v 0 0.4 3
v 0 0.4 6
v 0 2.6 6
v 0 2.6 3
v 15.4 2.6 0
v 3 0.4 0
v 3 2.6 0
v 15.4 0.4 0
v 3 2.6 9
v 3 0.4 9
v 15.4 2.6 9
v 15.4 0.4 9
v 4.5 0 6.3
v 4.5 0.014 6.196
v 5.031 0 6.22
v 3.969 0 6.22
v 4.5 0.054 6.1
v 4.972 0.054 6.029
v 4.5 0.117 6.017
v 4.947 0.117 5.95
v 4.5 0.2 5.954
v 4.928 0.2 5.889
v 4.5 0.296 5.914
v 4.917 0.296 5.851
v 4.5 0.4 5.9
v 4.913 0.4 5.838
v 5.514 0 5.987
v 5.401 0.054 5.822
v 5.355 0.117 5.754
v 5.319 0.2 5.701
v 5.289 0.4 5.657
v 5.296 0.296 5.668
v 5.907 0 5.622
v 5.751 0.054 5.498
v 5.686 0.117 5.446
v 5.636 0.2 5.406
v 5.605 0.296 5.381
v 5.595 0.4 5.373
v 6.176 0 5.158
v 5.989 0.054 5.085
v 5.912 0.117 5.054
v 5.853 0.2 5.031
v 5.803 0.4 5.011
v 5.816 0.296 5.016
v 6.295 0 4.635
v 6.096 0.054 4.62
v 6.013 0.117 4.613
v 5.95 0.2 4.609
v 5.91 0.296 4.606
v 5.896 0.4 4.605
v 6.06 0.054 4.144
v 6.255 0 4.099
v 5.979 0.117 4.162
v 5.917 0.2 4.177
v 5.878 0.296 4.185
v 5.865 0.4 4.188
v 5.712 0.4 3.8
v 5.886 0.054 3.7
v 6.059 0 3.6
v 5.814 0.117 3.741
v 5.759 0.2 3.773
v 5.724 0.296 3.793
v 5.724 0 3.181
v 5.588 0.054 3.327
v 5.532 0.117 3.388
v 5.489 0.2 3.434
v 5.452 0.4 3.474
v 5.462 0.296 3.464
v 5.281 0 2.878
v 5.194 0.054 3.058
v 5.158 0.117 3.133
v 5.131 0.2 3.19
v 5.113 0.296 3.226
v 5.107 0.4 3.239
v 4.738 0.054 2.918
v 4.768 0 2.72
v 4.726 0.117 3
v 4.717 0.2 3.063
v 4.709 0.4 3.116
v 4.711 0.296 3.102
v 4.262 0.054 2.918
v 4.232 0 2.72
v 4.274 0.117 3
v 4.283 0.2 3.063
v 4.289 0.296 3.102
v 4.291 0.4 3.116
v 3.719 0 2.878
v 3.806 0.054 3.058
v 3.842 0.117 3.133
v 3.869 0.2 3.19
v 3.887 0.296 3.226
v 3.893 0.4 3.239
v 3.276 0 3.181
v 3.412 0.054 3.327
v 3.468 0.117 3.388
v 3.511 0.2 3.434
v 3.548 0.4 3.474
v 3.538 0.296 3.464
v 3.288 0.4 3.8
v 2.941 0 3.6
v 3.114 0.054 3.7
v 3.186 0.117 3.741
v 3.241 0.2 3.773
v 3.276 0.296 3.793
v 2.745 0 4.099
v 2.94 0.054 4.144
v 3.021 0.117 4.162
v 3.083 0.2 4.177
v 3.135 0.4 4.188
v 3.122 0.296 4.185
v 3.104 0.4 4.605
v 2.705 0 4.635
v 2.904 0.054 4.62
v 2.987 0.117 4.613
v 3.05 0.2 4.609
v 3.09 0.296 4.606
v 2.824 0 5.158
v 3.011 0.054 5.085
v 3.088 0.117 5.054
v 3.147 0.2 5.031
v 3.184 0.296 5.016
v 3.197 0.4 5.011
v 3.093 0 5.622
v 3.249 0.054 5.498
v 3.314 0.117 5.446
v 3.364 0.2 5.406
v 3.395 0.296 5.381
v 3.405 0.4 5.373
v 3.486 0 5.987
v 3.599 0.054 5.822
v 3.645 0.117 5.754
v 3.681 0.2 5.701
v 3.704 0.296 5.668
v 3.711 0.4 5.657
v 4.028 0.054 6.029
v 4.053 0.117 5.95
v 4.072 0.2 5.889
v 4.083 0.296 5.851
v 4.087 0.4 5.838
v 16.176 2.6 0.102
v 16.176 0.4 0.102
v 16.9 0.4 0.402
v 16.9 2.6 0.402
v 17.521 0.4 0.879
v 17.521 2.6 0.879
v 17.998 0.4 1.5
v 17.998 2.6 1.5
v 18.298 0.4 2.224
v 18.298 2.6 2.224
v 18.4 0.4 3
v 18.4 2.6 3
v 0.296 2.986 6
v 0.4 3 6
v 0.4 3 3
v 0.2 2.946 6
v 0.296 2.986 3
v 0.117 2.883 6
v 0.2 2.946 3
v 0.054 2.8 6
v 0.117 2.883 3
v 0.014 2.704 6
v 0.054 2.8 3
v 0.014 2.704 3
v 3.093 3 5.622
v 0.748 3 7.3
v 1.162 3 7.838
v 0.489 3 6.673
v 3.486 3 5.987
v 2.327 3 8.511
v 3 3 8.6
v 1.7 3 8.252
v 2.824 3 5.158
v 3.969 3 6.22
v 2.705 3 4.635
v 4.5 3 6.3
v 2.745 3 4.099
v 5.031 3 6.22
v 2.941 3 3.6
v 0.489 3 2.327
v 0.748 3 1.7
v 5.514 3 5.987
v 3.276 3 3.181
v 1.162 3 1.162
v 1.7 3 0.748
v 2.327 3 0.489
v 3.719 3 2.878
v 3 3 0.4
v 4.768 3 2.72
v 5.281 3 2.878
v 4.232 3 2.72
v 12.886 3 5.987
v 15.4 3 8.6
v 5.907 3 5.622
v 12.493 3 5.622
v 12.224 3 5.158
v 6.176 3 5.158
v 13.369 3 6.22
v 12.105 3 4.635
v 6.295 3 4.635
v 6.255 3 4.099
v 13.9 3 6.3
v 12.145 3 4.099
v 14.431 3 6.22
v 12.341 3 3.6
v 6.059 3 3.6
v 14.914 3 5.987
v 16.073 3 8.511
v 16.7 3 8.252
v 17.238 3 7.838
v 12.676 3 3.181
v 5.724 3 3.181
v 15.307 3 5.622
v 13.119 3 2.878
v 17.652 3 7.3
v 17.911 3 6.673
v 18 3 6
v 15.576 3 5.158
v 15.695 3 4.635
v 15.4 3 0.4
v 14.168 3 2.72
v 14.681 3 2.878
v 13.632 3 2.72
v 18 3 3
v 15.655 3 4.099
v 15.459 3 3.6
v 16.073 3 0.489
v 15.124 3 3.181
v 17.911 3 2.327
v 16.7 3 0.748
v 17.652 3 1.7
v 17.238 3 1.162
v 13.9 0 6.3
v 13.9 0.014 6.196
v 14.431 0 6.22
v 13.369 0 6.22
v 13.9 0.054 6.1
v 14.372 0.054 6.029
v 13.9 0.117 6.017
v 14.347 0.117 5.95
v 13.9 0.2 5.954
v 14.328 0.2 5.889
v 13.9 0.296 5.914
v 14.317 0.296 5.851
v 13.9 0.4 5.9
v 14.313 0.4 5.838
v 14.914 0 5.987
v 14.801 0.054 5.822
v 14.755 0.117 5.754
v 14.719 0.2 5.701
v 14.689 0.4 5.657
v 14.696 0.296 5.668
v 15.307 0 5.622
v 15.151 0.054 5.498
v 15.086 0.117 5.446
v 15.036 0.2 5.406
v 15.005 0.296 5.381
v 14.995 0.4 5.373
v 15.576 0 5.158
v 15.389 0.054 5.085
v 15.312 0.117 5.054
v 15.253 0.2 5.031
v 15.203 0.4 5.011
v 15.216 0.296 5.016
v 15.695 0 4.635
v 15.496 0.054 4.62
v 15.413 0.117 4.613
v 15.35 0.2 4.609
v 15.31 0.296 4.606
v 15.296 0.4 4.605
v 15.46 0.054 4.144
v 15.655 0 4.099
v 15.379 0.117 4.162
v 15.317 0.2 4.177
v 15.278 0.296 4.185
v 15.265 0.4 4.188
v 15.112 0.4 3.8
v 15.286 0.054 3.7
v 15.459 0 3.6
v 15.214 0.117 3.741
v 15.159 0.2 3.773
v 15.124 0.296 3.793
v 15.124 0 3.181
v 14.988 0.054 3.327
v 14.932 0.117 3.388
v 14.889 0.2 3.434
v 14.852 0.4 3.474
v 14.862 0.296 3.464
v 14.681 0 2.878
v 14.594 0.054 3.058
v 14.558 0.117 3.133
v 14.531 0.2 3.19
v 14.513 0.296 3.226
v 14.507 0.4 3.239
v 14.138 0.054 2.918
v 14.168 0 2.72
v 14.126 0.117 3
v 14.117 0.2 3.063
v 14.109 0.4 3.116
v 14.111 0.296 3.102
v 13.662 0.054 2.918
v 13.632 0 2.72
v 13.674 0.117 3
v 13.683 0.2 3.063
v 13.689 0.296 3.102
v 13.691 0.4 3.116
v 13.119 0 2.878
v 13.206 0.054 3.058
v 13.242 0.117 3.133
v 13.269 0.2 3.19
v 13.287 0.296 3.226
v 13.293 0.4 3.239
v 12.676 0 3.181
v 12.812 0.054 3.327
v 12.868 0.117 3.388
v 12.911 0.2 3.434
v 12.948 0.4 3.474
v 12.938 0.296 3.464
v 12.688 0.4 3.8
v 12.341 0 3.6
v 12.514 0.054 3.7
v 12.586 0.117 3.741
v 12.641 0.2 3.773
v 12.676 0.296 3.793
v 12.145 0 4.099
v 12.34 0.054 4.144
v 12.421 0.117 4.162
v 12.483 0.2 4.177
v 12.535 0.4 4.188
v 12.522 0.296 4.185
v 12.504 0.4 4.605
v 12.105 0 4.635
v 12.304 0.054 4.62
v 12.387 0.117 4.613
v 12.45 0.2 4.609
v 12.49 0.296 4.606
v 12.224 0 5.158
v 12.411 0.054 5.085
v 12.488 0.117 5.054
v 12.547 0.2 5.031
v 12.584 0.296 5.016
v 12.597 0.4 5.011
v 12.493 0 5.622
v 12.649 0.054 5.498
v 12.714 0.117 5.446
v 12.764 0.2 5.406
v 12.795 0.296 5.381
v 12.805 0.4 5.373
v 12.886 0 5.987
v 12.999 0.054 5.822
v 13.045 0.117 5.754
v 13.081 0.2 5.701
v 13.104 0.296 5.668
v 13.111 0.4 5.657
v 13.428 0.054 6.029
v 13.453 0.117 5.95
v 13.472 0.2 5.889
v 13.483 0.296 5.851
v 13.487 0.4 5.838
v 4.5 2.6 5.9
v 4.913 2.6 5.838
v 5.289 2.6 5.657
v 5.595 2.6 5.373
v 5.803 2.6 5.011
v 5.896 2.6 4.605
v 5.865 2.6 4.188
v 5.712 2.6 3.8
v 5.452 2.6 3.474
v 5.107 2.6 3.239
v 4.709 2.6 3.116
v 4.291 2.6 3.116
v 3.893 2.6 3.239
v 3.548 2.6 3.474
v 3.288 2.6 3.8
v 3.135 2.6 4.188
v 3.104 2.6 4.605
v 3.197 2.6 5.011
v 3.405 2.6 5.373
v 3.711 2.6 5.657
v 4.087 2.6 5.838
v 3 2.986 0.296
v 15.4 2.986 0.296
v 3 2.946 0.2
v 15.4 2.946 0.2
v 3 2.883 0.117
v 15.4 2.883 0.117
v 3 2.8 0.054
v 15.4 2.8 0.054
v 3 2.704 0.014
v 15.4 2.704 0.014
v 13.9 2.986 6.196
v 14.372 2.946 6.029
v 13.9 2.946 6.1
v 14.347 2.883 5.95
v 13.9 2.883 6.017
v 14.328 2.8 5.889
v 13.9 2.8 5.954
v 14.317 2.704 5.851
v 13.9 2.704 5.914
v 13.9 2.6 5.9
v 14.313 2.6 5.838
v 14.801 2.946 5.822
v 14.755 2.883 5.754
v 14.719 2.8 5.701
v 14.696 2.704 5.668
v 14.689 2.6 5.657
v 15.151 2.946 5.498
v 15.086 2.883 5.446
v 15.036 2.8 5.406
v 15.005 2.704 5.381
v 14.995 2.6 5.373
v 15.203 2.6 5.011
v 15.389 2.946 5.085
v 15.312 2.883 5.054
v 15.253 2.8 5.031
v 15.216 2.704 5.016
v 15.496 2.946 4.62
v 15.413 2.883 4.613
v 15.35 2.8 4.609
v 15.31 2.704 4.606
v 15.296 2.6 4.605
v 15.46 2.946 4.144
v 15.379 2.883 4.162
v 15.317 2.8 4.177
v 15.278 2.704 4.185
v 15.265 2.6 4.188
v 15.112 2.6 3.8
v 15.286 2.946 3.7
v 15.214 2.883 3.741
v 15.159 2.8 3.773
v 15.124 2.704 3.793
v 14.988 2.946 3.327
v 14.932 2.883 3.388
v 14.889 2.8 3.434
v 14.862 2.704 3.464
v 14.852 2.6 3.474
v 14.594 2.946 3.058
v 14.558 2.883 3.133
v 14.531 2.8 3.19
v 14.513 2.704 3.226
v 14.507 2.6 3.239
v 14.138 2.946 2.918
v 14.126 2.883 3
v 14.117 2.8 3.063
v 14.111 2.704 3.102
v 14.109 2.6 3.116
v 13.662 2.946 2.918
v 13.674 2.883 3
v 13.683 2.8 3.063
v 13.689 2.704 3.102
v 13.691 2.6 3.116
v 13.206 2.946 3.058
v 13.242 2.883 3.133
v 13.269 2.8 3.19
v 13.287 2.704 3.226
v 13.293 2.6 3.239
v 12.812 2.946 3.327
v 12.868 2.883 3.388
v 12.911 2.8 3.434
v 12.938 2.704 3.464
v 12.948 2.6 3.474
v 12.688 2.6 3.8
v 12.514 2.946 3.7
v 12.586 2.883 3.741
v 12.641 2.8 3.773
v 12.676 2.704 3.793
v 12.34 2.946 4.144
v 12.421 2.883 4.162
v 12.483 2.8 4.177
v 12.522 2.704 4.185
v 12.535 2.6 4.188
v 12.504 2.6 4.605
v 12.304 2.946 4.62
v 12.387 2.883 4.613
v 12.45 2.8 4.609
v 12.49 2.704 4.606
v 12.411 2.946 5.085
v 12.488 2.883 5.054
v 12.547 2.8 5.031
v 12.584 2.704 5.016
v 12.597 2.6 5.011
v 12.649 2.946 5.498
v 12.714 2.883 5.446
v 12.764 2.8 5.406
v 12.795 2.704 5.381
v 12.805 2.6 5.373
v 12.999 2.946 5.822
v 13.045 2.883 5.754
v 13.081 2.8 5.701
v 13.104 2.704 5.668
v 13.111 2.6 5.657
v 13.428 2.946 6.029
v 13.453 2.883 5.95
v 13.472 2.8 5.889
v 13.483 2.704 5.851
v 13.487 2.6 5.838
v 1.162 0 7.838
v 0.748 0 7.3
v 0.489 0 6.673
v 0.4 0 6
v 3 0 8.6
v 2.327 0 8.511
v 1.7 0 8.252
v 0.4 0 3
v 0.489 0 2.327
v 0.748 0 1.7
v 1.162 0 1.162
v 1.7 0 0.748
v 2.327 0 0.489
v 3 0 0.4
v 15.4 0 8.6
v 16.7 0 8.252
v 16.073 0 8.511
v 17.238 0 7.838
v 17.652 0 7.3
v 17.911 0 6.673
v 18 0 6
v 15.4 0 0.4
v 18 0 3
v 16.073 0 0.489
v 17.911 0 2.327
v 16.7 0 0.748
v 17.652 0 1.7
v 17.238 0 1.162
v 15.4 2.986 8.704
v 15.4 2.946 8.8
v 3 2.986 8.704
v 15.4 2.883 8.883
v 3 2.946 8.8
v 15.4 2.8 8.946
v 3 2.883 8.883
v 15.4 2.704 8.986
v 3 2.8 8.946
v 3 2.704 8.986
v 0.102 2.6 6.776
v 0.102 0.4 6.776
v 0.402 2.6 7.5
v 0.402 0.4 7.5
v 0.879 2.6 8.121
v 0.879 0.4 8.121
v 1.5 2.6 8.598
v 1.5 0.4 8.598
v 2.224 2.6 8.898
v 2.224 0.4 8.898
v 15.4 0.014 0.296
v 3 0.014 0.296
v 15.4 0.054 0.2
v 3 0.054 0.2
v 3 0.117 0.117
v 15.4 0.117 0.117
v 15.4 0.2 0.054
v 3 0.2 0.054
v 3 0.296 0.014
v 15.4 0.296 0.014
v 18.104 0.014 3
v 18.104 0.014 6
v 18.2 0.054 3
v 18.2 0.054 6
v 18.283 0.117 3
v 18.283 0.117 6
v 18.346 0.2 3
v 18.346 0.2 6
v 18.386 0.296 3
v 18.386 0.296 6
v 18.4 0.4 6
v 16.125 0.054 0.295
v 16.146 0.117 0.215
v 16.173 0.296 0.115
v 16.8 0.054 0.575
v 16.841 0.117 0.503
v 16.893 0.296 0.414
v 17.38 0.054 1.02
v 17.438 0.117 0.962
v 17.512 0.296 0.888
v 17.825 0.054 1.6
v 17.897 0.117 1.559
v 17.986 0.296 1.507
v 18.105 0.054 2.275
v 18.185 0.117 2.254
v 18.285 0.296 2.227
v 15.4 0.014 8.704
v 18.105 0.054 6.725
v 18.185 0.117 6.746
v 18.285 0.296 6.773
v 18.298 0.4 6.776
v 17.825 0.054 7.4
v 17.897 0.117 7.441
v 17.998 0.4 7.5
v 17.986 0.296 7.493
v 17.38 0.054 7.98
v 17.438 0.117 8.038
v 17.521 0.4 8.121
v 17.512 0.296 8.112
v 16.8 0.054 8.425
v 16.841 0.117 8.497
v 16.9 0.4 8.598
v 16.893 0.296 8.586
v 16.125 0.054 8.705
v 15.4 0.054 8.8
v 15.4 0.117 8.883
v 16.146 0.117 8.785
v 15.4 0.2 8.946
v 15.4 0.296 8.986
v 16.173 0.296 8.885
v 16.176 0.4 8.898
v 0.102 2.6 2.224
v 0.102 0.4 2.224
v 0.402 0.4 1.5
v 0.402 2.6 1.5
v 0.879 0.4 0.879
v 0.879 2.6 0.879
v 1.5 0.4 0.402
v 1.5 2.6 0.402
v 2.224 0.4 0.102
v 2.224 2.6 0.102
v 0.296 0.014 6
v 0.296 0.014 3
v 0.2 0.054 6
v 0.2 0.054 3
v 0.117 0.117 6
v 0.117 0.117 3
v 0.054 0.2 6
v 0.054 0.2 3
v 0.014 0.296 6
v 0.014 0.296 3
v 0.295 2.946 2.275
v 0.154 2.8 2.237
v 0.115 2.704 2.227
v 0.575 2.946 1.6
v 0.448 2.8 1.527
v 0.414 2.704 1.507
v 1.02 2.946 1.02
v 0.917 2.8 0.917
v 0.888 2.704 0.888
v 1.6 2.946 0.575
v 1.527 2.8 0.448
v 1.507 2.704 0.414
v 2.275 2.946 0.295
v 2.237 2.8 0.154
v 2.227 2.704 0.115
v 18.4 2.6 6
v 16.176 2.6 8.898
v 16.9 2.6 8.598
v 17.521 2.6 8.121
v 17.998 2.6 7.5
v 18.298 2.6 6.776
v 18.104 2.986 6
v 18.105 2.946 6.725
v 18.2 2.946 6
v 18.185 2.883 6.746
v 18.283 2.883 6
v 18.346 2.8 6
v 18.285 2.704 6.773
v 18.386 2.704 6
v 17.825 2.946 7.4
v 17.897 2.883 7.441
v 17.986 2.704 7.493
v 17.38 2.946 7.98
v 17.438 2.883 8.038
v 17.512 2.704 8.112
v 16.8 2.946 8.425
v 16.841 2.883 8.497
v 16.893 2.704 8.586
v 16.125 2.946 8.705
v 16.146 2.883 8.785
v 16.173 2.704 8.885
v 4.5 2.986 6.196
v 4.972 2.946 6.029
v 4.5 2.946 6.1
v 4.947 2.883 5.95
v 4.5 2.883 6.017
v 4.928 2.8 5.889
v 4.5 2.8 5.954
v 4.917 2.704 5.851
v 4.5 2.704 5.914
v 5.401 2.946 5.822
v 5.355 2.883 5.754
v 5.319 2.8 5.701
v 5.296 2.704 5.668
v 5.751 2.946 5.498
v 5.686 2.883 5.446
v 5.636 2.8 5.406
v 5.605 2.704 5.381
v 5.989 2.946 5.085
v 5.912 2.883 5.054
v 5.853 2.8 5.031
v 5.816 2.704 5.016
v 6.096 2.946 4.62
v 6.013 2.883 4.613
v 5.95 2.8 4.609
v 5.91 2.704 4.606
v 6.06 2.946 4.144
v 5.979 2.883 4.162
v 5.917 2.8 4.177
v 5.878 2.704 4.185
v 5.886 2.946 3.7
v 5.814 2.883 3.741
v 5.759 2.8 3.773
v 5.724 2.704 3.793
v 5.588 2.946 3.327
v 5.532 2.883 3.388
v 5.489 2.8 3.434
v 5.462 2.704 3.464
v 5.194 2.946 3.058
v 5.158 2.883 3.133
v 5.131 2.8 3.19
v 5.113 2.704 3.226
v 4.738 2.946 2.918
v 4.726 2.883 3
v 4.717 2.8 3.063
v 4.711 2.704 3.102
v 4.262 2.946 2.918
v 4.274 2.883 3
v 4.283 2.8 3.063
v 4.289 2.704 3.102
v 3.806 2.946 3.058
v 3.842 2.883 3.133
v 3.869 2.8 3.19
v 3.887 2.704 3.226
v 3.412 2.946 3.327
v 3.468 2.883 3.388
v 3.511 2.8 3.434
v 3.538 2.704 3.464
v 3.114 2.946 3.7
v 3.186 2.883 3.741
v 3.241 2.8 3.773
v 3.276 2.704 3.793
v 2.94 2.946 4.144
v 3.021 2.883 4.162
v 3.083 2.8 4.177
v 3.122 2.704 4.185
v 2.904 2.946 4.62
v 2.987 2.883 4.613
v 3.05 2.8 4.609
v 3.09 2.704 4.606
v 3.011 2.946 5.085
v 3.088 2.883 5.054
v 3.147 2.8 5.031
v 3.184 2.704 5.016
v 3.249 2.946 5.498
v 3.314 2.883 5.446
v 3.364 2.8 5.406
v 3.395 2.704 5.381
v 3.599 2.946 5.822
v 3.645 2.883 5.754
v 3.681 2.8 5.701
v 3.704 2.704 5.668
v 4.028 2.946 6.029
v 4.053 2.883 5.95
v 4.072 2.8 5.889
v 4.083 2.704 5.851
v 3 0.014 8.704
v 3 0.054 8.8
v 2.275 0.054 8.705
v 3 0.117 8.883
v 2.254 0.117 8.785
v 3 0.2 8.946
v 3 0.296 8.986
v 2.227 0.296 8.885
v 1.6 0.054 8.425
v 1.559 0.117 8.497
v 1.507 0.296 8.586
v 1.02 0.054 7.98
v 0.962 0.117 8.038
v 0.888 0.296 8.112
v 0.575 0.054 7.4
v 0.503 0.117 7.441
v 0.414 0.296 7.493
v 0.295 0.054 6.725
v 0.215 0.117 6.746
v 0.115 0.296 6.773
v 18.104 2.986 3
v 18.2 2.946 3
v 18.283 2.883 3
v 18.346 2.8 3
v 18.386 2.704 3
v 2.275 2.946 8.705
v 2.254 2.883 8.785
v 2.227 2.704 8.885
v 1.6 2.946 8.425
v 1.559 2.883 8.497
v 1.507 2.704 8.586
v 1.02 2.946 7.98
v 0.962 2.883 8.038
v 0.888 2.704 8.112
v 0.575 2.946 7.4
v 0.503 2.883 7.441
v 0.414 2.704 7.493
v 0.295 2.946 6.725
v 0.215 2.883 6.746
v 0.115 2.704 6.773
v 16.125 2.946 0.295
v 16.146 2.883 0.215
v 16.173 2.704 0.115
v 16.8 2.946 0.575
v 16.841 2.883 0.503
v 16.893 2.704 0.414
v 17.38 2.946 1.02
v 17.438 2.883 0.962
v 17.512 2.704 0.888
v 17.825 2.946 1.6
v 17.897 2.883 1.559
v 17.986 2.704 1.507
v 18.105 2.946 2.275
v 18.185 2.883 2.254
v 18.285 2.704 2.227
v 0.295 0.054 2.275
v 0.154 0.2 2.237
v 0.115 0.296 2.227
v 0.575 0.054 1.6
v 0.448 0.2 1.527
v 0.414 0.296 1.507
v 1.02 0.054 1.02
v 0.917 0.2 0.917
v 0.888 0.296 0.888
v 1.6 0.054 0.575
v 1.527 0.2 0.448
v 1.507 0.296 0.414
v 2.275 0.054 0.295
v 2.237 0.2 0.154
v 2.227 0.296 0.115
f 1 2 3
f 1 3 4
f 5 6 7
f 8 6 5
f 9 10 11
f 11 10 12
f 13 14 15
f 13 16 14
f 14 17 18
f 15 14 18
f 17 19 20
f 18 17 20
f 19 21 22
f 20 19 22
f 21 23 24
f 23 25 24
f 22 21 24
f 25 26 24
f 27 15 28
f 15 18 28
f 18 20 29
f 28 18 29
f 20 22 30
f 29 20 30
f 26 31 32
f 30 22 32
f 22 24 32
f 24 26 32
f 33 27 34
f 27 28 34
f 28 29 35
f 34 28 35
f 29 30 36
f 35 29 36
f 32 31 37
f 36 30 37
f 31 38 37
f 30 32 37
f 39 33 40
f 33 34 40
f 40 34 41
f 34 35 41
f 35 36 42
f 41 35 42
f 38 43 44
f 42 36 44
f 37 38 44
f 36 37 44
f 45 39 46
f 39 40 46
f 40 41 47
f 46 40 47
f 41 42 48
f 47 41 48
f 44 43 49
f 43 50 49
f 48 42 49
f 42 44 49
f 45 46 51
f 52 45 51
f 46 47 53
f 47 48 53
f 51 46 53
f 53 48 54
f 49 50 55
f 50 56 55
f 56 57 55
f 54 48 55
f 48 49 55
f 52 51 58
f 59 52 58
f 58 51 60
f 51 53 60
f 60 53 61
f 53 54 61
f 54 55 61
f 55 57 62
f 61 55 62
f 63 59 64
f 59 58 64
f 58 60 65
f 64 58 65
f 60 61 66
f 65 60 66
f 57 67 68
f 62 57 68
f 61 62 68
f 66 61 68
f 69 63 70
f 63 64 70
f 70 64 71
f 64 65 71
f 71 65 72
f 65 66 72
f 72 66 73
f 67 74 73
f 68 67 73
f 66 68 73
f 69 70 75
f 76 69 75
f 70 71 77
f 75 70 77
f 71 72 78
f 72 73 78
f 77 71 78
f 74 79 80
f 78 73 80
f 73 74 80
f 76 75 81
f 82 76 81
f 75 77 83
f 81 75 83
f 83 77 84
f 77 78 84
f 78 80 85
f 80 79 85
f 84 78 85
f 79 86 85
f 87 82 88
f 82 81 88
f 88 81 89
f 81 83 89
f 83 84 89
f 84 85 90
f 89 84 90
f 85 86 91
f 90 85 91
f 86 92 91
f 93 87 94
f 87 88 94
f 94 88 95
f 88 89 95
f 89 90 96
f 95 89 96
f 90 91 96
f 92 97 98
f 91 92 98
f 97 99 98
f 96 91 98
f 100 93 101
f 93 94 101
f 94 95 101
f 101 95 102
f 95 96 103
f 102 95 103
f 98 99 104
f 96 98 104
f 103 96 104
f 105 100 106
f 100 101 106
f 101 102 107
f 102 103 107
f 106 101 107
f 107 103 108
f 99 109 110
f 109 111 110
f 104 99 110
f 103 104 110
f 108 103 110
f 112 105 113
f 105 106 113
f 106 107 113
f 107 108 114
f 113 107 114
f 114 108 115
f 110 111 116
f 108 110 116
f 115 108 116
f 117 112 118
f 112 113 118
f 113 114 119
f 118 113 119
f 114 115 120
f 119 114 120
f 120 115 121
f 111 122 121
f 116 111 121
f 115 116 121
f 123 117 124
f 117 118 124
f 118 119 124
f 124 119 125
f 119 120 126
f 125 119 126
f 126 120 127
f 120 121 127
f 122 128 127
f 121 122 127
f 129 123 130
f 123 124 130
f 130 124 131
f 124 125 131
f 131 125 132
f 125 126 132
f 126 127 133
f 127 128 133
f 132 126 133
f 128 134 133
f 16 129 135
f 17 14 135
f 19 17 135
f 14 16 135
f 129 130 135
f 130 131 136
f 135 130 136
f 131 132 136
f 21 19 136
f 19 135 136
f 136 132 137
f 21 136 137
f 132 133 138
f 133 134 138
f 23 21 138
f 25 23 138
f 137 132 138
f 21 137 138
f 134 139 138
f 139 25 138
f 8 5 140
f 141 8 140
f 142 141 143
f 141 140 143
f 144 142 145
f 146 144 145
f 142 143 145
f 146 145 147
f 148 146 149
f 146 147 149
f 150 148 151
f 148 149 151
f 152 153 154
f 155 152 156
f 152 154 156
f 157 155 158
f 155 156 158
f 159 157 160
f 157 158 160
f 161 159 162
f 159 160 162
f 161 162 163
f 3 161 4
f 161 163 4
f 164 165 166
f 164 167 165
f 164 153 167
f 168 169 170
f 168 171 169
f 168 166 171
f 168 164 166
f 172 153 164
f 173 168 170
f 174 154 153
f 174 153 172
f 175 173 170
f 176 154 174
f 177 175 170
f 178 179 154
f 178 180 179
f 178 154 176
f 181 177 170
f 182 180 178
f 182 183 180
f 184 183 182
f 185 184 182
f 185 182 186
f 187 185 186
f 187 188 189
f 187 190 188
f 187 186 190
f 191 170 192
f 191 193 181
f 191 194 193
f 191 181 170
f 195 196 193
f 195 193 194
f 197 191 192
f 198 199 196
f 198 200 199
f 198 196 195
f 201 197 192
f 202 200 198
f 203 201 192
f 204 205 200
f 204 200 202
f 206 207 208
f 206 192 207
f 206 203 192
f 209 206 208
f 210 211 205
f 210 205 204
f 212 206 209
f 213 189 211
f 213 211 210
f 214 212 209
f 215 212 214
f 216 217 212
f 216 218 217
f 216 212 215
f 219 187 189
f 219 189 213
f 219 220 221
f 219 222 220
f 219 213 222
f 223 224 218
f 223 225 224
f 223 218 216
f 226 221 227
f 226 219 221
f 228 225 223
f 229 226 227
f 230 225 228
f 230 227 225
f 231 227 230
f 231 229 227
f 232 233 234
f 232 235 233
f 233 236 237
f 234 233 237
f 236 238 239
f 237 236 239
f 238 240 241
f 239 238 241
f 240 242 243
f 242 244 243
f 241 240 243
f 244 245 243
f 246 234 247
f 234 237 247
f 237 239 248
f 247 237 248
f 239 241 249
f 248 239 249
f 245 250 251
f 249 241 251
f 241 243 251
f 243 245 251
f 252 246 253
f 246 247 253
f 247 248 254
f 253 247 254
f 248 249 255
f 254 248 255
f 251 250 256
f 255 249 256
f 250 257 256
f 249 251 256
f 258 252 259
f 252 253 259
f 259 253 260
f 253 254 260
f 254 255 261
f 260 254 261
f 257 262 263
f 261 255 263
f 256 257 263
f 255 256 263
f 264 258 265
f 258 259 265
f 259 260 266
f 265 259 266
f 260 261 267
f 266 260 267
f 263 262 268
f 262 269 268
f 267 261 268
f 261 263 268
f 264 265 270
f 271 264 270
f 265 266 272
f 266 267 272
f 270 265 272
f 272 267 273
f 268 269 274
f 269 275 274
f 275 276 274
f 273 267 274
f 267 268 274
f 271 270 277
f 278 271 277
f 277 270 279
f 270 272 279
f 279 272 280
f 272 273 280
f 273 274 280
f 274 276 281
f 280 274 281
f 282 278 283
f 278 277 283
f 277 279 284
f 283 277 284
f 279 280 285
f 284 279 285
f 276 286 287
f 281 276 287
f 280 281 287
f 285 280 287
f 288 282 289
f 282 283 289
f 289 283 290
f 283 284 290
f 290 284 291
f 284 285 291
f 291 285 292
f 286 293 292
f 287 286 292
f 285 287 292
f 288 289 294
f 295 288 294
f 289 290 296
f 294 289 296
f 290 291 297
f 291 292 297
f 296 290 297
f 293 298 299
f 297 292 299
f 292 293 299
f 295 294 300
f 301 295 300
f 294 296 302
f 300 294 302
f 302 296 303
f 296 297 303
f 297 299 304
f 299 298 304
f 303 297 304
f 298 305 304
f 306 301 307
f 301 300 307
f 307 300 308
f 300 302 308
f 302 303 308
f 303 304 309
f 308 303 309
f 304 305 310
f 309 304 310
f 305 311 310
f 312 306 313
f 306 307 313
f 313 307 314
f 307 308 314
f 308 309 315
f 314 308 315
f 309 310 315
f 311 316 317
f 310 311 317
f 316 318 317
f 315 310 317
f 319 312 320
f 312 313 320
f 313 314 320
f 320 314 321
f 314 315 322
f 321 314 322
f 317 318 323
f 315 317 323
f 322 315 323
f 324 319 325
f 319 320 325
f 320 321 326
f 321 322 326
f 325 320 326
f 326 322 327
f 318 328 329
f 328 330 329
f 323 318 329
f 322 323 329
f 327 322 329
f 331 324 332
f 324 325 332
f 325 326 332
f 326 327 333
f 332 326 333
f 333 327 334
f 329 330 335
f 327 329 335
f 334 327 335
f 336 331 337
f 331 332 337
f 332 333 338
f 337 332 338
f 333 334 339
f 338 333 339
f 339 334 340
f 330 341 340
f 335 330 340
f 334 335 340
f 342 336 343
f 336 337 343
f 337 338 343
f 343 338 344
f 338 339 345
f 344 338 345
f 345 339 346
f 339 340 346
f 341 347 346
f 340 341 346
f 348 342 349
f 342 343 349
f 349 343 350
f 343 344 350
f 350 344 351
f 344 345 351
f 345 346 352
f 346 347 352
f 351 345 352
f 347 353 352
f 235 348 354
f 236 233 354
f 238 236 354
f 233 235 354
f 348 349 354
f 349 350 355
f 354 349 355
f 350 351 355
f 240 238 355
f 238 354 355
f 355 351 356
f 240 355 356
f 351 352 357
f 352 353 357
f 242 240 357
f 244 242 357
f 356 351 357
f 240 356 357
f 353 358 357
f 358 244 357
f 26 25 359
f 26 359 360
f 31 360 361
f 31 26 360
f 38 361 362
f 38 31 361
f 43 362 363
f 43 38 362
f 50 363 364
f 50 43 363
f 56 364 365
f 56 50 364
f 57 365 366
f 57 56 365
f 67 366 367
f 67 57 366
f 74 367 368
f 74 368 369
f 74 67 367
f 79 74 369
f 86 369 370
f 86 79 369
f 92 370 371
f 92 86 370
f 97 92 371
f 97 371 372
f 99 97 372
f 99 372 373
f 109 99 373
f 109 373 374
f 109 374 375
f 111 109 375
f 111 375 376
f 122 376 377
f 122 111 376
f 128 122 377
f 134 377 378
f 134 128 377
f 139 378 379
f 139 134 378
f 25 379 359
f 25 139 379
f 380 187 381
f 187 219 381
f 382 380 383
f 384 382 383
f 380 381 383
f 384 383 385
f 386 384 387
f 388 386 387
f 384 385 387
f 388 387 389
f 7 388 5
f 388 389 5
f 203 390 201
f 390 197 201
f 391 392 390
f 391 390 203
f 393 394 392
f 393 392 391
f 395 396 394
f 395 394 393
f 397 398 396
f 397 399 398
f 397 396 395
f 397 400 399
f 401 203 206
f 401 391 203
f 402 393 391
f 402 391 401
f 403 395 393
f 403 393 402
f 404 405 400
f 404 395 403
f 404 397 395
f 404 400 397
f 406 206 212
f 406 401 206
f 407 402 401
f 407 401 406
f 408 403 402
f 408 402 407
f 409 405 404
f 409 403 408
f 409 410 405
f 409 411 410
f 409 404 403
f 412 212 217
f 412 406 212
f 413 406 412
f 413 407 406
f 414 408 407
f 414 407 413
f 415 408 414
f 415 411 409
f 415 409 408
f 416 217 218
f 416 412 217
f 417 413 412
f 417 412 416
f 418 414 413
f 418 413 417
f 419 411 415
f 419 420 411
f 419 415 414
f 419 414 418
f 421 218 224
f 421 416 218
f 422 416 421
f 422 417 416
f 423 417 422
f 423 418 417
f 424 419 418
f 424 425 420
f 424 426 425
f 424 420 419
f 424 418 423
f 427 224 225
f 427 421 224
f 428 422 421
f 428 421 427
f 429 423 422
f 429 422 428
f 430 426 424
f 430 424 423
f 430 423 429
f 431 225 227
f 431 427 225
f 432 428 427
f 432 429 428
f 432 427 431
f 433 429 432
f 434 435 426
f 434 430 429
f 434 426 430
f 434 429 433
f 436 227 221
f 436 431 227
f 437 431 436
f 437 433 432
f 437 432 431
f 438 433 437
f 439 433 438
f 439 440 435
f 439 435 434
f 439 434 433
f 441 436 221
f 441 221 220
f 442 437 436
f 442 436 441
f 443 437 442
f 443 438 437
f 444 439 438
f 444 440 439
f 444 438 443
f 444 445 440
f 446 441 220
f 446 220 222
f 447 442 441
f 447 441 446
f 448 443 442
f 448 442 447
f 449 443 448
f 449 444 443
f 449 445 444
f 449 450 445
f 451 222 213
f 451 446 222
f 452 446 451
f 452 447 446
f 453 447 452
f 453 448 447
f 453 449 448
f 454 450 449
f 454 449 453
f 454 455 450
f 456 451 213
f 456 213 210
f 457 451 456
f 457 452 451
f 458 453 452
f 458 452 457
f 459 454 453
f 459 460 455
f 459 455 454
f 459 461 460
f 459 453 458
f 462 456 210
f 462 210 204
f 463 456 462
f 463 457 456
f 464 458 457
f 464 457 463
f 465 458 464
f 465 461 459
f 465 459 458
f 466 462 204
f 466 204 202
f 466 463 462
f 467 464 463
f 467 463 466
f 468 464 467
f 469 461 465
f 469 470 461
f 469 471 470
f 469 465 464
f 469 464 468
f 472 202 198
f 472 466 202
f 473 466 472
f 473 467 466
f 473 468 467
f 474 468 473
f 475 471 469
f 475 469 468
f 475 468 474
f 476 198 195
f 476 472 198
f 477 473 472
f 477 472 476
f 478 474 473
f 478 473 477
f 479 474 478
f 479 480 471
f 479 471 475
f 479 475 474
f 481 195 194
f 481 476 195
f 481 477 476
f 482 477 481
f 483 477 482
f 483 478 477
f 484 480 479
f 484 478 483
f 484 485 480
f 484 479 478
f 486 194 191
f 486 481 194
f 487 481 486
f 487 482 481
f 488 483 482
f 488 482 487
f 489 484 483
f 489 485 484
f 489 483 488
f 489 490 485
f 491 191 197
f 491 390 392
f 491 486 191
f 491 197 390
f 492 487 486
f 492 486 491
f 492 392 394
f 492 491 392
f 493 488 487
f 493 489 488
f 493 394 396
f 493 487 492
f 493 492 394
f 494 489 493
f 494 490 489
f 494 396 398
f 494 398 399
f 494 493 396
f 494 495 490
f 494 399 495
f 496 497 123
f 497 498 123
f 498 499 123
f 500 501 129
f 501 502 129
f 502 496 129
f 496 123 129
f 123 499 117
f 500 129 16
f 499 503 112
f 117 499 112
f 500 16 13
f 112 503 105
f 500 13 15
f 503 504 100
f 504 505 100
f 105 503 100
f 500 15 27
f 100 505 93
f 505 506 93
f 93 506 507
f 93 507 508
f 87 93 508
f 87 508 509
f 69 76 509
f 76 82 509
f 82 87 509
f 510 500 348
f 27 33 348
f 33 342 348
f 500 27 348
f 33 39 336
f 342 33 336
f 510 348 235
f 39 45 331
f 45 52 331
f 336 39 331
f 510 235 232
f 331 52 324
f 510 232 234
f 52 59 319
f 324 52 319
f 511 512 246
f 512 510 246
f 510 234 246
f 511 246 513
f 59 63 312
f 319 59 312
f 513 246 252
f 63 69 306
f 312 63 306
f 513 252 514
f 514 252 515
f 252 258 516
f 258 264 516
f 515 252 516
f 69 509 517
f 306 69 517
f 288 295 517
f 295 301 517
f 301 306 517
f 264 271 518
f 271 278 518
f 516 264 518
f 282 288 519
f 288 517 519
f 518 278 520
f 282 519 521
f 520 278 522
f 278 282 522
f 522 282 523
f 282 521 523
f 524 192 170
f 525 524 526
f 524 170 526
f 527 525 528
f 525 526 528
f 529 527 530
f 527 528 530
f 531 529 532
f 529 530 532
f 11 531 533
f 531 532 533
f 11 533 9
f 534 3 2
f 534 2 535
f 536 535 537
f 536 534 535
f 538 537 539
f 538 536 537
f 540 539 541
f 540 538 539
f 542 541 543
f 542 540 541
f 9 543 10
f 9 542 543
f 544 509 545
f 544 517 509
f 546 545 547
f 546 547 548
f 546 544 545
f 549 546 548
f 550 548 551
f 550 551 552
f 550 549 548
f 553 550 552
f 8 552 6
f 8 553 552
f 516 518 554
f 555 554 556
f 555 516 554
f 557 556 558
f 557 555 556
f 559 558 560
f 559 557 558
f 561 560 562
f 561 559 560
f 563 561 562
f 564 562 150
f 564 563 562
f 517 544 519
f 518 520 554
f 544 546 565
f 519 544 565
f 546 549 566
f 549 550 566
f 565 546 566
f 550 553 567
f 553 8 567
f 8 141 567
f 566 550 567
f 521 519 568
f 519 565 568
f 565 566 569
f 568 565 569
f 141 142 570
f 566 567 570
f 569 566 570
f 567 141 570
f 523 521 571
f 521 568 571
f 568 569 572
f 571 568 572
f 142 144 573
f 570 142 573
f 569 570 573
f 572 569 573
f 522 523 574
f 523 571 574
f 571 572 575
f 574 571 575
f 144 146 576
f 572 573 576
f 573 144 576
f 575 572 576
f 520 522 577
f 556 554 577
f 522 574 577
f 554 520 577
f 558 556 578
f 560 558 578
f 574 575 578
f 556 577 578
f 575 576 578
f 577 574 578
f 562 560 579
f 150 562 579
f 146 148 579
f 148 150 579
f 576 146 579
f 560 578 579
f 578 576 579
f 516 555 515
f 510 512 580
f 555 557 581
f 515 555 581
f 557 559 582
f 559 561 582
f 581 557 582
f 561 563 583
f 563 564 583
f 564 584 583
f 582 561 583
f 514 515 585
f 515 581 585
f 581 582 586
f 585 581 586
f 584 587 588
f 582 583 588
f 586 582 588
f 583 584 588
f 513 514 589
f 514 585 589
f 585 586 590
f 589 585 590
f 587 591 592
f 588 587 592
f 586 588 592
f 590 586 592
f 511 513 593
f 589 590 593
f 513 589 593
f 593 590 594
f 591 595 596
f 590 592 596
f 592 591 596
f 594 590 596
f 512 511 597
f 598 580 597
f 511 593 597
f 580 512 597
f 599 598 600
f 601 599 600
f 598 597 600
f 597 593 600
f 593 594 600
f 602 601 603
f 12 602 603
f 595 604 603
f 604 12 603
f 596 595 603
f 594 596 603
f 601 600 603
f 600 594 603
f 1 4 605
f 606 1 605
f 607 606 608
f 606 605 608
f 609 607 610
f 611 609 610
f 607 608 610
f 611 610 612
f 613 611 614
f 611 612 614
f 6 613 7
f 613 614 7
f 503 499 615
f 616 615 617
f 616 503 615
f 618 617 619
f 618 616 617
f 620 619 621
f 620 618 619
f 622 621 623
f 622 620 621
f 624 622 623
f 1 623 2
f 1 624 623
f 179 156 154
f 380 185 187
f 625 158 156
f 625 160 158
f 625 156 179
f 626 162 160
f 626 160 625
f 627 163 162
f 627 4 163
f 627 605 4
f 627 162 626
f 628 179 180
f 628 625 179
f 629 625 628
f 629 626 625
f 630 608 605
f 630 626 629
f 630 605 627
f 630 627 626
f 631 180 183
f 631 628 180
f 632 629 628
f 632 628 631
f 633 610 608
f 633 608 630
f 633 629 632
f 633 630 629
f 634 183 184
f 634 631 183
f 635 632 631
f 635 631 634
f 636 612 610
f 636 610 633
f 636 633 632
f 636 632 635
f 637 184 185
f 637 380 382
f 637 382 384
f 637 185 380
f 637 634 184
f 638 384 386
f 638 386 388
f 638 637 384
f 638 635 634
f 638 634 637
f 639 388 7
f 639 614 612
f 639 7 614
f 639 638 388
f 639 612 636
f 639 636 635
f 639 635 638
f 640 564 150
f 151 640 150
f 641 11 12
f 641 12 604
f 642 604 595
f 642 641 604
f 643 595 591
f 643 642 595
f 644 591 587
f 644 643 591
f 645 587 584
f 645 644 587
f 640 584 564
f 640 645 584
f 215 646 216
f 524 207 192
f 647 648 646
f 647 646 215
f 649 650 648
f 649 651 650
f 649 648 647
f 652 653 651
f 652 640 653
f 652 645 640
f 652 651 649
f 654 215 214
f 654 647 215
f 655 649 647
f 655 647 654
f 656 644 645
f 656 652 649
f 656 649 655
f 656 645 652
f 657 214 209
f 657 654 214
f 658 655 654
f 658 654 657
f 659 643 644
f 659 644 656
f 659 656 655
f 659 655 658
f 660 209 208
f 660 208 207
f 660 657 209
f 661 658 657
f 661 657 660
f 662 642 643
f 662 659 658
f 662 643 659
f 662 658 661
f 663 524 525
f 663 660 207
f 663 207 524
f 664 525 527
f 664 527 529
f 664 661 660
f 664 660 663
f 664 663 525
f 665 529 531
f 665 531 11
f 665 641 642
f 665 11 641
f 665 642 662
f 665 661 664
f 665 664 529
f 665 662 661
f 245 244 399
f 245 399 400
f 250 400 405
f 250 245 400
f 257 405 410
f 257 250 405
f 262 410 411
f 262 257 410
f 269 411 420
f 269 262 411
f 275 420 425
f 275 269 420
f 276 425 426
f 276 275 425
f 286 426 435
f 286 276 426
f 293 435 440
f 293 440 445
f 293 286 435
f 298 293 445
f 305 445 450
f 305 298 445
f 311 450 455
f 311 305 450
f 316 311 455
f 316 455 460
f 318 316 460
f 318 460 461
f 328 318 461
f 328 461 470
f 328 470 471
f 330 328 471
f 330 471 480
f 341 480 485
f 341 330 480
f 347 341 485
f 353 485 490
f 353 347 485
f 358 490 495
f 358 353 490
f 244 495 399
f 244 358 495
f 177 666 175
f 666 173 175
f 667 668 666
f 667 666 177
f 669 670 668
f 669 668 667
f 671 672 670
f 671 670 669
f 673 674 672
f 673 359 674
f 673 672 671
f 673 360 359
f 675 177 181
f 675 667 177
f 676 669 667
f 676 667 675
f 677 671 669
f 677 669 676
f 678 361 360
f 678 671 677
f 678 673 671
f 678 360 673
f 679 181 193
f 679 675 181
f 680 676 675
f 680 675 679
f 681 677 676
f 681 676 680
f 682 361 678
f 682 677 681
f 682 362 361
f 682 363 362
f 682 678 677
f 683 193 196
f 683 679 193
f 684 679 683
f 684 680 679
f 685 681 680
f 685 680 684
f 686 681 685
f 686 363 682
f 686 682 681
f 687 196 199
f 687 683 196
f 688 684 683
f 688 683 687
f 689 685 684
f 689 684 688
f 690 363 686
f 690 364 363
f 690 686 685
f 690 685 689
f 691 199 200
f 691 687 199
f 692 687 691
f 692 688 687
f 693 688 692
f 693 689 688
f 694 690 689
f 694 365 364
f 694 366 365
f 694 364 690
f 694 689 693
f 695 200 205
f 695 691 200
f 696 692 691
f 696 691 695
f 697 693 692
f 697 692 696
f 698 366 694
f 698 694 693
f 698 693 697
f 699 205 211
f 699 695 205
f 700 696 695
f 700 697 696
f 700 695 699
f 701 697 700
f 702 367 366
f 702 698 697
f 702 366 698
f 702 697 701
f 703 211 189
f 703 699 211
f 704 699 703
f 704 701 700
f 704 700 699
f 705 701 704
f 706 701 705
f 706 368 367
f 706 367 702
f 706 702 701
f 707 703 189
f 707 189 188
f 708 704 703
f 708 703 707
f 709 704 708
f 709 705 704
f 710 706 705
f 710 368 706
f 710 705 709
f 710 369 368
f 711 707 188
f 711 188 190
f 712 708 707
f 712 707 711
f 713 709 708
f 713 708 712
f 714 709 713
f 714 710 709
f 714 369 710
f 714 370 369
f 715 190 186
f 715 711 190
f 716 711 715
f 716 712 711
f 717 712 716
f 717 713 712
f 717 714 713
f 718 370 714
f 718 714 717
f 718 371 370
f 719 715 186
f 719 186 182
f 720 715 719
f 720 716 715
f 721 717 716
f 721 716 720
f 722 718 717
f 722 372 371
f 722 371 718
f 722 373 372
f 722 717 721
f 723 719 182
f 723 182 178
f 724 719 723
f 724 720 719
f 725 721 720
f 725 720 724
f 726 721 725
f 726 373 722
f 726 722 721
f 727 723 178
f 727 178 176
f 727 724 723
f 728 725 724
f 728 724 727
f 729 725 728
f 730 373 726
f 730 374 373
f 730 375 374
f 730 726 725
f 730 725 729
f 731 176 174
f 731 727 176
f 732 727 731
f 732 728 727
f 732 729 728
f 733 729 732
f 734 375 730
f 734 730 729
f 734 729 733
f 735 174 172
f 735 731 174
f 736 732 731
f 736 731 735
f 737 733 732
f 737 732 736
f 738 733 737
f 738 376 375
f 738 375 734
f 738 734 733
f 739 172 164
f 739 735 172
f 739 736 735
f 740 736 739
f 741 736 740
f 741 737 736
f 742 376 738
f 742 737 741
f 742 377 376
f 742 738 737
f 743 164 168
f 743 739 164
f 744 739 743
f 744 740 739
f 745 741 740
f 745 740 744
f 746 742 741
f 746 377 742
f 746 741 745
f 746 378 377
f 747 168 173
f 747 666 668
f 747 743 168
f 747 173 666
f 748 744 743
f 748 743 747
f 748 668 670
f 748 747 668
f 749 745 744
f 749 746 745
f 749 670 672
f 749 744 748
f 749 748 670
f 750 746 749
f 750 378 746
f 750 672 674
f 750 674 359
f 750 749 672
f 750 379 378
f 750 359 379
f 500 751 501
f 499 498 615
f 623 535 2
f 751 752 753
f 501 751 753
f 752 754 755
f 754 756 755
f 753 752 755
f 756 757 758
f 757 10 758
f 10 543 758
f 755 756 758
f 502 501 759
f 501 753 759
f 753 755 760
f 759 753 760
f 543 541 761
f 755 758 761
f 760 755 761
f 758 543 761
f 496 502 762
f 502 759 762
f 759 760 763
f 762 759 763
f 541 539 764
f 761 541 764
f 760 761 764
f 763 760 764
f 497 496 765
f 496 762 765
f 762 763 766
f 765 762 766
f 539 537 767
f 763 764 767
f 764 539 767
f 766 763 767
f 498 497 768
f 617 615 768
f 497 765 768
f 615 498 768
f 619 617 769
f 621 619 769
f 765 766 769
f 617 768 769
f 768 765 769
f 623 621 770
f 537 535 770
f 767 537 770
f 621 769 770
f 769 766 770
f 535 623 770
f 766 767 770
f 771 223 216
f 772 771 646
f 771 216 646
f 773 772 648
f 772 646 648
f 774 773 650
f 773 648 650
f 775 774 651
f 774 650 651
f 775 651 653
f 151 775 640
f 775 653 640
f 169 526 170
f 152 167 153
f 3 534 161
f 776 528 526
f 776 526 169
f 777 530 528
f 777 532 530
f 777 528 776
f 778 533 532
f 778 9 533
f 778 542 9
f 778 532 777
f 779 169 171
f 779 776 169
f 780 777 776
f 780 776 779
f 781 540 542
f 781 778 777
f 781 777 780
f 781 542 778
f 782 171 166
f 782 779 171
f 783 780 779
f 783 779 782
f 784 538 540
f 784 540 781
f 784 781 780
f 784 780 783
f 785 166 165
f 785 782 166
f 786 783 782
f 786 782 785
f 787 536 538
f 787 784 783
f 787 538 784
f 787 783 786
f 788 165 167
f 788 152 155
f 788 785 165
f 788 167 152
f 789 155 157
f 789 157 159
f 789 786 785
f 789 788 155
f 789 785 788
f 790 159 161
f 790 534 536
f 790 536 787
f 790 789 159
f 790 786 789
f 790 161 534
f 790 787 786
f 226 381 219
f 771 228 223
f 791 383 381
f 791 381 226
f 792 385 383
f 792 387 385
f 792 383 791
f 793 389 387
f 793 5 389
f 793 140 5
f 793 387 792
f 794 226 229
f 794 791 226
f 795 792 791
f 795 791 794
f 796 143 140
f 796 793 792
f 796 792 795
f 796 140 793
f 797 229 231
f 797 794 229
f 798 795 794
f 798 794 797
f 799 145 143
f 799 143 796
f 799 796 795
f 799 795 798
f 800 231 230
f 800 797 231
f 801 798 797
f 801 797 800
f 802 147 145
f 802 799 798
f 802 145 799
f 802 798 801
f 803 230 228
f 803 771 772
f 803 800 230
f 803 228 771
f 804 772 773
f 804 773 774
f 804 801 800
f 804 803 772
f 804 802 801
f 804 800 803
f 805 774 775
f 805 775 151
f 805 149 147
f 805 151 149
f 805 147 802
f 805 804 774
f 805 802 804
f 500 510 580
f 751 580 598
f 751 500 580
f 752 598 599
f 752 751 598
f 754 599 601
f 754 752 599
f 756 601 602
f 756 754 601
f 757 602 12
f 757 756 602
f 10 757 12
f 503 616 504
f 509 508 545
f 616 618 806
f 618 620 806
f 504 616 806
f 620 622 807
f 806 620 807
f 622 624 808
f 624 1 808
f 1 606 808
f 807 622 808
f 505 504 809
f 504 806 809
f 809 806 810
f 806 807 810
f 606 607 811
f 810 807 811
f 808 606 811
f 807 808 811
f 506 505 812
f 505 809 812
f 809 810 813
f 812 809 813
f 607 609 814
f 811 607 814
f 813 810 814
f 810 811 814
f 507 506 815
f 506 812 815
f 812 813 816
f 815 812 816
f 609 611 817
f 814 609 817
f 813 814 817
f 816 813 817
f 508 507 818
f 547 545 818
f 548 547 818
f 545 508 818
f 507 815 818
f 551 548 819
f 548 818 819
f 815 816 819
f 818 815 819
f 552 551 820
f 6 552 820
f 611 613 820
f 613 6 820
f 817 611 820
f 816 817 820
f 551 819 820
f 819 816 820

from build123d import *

# Parameters (mm, degrees)
SKETCH1_W           = 18.4
SKETCH1_H           = 9
SKETCH1_R           = 1.4
BOSS_EXTRUDE1_DEPTH = 3
FILLET2_R           = 3
FILLET3_R           = 0.4


with BuildPart() as part:
    # Sketch1 → Boss-Extrude1 (new body)
    with BuildSketch(Plane(origin=(0, 0, 0), x_dir=(1, 0, 0), z_dir=(0, 1, 0))):
        with Locations((9.2, -4.5)):
            Rectangle(SKETCH1_W, SKETCH1_H)
        with Locations(Location((4.5, -4.5, 0), (0, 0, 270))):
            Circle(SKETCH1_R, mode=Mode.SUBTRACT)
        with Locations(Location((13.9, -4.5, 0), (0, 0, 270))):
            Circle(SKETCH1_R, mode=Mode.SUBTRACT)
    extrude(amount=BOSS_EXTRUDE1_DEPTH)

    # Fillet2
    fillet2_edges = [part.edges().sort_by_distance(p)[0] for p in [
        (0, 1.5, 0),
        (18.4, 1.5, 0),
        (18.4, 1.5, 9),
        (0, 1.5, 9),
    ]]
    fillet(fillet2_edges, radius=FILLET2_R)

    # Fillet3
    fillet3_edges = [part.edges().sort_by_distance(p)[0] for p in [
        (4.5, 0, 3.1),
        (4.5, 3, 3.1),
        (13.9, 0, 3.1),
        (13.9, 3, 3.1),
        (9.2, 0, 0),
        (9.2, 3, 0),
        (0, 0, 4.5),
        (18.4, 0, 4.5),
        (9.2, 0, 9),
        (0.878679656, 0, 0.878679656),
        (0.878679656, 0, 8.121320344),
        (17.521320344, 0, 8.121320344),
        (17.521320344, 0, 0.878679656),
        (18.4, 3, 4.5),
        (0, 3, 4.5),
        (9.2, 3, 9),
        (0.878679656, 3, 0.878679656),
        (0.878679656, 3, 8.121320344),
        (17.521320344, 3, 8.121320344),
        (17.521320344, 3, 0.878679656),
    ]]
    fillet(fillet3_edges, radius=FILLET3_R)


solid = part.part
